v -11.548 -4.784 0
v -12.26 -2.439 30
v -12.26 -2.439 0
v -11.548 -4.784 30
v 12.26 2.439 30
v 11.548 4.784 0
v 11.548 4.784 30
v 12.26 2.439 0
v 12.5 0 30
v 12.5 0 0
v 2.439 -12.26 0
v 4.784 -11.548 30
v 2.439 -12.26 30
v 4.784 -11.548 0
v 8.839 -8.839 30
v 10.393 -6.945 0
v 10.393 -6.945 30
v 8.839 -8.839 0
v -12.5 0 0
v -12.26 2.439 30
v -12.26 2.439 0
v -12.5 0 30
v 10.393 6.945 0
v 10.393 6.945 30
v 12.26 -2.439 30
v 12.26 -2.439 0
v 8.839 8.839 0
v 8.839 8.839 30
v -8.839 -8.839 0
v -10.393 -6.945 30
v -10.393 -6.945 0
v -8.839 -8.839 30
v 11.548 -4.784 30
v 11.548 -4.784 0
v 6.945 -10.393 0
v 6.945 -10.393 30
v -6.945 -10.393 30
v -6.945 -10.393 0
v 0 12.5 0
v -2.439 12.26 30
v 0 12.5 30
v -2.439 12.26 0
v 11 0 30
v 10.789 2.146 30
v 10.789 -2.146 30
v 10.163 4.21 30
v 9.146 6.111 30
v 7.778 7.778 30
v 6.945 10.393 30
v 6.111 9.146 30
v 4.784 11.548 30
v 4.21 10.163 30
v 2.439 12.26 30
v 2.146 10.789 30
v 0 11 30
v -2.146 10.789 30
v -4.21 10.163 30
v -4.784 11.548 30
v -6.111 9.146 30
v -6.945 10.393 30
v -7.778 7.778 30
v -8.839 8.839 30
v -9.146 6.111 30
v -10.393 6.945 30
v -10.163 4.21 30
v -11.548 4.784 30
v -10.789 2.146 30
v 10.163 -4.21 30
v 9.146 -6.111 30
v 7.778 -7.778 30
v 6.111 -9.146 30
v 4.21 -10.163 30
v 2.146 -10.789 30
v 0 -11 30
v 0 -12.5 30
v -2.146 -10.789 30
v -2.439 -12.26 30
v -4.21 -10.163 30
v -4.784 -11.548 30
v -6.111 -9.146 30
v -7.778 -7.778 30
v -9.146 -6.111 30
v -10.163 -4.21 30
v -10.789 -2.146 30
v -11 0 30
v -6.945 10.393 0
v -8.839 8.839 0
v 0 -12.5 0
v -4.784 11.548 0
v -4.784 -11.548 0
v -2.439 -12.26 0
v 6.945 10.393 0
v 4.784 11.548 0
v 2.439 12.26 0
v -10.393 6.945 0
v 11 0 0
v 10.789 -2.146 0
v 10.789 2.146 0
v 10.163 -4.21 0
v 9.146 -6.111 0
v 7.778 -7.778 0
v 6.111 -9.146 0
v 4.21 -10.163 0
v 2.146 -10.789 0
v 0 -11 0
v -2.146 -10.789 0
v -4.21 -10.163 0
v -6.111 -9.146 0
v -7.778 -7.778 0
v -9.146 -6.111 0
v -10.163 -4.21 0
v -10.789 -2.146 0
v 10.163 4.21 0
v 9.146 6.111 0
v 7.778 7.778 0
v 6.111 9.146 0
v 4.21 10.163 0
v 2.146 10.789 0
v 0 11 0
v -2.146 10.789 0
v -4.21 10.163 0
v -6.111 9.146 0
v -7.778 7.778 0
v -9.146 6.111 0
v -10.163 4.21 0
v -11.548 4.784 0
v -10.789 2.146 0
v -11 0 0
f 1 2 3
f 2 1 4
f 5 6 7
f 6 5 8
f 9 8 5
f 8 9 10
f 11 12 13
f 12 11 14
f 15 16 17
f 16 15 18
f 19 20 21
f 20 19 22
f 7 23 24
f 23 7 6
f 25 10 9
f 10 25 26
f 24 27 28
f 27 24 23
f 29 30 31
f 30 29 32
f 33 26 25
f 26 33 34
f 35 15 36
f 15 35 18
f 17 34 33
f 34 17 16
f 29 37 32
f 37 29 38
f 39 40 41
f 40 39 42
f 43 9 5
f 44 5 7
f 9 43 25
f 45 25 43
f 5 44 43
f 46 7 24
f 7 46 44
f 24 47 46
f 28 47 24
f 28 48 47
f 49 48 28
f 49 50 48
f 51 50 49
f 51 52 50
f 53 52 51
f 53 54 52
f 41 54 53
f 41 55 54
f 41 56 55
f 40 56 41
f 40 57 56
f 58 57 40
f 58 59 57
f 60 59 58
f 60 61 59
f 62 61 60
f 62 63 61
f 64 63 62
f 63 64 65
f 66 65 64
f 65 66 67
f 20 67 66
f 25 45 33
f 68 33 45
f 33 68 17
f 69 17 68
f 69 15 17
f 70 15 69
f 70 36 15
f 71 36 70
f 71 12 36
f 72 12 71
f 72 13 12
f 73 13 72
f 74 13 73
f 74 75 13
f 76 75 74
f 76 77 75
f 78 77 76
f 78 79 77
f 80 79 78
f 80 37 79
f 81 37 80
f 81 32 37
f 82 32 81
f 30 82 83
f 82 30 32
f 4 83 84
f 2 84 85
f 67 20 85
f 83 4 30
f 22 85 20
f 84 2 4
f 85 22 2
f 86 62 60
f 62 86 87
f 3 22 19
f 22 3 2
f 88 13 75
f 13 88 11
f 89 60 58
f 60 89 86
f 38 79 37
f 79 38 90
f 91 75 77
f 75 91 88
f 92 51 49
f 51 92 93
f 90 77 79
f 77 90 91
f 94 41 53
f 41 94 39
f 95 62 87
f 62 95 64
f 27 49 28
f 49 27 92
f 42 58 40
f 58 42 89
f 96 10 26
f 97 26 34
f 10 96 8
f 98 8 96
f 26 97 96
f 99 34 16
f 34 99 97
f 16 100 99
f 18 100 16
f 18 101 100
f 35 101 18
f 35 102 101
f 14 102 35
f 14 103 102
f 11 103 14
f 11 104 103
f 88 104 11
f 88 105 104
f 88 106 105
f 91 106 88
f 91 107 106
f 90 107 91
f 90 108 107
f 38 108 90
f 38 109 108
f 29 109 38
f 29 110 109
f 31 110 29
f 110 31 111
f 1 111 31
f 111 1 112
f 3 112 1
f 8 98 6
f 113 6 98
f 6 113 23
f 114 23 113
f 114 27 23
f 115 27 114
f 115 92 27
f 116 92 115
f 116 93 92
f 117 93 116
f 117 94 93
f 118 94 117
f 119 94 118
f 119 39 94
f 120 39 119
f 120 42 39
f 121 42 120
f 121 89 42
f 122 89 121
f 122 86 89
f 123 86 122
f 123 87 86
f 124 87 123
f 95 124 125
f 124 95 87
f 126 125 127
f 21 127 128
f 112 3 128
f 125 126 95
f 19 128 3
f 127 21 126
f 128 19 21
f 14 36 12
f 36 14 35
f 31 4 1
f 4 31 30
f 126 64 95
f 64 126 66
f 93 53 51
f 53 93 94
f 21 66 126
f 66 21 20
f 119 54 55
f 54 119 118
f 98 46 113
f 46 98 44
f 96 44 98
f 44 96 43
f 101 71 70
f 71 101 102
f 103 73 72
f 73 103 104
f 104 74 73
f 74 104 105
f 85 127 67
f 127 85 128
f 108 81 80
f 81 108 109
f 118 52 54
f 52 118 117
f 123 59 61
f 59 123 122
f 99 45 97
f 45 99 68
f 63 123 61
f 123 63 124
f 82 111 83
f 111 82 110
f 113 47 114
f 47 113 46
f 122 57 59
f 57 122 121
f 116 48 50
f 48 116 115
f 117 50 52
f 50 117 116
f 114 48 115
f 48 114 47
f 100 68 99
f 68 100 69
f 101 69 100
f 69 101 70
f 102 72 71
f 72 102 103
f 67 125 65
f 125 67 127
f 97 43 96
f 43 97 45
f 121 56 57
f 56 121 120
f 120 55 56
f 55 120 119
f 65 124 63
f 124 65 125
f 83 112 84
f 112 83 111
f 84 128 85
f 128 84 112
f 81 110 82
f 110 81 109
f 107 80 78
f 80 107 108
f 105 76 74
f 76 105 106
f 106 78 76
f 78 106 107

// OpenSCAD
$fn = 32;

// ----------------------------------------------------------------------
// Thin tube: 1.5 mm wall
// ----------------------------------------------------------------------

// --- parameters (mm) ---
tube_od = 25;             // outer diameter
tube_h = 30;              // height, Z
wall = 1.5;               // wall thickness
fit_tol = 0.05;           // tolerance for press fits, mm
free_tol = 0.2;           // tolerance for clearance fits, mm

difference() {
  cylinder(h = tube_h, d = tube_od);
  translate([0, 0, -1]) cylinder(h = tube_h + 2, d = tube_od - 2 * wall);
}
